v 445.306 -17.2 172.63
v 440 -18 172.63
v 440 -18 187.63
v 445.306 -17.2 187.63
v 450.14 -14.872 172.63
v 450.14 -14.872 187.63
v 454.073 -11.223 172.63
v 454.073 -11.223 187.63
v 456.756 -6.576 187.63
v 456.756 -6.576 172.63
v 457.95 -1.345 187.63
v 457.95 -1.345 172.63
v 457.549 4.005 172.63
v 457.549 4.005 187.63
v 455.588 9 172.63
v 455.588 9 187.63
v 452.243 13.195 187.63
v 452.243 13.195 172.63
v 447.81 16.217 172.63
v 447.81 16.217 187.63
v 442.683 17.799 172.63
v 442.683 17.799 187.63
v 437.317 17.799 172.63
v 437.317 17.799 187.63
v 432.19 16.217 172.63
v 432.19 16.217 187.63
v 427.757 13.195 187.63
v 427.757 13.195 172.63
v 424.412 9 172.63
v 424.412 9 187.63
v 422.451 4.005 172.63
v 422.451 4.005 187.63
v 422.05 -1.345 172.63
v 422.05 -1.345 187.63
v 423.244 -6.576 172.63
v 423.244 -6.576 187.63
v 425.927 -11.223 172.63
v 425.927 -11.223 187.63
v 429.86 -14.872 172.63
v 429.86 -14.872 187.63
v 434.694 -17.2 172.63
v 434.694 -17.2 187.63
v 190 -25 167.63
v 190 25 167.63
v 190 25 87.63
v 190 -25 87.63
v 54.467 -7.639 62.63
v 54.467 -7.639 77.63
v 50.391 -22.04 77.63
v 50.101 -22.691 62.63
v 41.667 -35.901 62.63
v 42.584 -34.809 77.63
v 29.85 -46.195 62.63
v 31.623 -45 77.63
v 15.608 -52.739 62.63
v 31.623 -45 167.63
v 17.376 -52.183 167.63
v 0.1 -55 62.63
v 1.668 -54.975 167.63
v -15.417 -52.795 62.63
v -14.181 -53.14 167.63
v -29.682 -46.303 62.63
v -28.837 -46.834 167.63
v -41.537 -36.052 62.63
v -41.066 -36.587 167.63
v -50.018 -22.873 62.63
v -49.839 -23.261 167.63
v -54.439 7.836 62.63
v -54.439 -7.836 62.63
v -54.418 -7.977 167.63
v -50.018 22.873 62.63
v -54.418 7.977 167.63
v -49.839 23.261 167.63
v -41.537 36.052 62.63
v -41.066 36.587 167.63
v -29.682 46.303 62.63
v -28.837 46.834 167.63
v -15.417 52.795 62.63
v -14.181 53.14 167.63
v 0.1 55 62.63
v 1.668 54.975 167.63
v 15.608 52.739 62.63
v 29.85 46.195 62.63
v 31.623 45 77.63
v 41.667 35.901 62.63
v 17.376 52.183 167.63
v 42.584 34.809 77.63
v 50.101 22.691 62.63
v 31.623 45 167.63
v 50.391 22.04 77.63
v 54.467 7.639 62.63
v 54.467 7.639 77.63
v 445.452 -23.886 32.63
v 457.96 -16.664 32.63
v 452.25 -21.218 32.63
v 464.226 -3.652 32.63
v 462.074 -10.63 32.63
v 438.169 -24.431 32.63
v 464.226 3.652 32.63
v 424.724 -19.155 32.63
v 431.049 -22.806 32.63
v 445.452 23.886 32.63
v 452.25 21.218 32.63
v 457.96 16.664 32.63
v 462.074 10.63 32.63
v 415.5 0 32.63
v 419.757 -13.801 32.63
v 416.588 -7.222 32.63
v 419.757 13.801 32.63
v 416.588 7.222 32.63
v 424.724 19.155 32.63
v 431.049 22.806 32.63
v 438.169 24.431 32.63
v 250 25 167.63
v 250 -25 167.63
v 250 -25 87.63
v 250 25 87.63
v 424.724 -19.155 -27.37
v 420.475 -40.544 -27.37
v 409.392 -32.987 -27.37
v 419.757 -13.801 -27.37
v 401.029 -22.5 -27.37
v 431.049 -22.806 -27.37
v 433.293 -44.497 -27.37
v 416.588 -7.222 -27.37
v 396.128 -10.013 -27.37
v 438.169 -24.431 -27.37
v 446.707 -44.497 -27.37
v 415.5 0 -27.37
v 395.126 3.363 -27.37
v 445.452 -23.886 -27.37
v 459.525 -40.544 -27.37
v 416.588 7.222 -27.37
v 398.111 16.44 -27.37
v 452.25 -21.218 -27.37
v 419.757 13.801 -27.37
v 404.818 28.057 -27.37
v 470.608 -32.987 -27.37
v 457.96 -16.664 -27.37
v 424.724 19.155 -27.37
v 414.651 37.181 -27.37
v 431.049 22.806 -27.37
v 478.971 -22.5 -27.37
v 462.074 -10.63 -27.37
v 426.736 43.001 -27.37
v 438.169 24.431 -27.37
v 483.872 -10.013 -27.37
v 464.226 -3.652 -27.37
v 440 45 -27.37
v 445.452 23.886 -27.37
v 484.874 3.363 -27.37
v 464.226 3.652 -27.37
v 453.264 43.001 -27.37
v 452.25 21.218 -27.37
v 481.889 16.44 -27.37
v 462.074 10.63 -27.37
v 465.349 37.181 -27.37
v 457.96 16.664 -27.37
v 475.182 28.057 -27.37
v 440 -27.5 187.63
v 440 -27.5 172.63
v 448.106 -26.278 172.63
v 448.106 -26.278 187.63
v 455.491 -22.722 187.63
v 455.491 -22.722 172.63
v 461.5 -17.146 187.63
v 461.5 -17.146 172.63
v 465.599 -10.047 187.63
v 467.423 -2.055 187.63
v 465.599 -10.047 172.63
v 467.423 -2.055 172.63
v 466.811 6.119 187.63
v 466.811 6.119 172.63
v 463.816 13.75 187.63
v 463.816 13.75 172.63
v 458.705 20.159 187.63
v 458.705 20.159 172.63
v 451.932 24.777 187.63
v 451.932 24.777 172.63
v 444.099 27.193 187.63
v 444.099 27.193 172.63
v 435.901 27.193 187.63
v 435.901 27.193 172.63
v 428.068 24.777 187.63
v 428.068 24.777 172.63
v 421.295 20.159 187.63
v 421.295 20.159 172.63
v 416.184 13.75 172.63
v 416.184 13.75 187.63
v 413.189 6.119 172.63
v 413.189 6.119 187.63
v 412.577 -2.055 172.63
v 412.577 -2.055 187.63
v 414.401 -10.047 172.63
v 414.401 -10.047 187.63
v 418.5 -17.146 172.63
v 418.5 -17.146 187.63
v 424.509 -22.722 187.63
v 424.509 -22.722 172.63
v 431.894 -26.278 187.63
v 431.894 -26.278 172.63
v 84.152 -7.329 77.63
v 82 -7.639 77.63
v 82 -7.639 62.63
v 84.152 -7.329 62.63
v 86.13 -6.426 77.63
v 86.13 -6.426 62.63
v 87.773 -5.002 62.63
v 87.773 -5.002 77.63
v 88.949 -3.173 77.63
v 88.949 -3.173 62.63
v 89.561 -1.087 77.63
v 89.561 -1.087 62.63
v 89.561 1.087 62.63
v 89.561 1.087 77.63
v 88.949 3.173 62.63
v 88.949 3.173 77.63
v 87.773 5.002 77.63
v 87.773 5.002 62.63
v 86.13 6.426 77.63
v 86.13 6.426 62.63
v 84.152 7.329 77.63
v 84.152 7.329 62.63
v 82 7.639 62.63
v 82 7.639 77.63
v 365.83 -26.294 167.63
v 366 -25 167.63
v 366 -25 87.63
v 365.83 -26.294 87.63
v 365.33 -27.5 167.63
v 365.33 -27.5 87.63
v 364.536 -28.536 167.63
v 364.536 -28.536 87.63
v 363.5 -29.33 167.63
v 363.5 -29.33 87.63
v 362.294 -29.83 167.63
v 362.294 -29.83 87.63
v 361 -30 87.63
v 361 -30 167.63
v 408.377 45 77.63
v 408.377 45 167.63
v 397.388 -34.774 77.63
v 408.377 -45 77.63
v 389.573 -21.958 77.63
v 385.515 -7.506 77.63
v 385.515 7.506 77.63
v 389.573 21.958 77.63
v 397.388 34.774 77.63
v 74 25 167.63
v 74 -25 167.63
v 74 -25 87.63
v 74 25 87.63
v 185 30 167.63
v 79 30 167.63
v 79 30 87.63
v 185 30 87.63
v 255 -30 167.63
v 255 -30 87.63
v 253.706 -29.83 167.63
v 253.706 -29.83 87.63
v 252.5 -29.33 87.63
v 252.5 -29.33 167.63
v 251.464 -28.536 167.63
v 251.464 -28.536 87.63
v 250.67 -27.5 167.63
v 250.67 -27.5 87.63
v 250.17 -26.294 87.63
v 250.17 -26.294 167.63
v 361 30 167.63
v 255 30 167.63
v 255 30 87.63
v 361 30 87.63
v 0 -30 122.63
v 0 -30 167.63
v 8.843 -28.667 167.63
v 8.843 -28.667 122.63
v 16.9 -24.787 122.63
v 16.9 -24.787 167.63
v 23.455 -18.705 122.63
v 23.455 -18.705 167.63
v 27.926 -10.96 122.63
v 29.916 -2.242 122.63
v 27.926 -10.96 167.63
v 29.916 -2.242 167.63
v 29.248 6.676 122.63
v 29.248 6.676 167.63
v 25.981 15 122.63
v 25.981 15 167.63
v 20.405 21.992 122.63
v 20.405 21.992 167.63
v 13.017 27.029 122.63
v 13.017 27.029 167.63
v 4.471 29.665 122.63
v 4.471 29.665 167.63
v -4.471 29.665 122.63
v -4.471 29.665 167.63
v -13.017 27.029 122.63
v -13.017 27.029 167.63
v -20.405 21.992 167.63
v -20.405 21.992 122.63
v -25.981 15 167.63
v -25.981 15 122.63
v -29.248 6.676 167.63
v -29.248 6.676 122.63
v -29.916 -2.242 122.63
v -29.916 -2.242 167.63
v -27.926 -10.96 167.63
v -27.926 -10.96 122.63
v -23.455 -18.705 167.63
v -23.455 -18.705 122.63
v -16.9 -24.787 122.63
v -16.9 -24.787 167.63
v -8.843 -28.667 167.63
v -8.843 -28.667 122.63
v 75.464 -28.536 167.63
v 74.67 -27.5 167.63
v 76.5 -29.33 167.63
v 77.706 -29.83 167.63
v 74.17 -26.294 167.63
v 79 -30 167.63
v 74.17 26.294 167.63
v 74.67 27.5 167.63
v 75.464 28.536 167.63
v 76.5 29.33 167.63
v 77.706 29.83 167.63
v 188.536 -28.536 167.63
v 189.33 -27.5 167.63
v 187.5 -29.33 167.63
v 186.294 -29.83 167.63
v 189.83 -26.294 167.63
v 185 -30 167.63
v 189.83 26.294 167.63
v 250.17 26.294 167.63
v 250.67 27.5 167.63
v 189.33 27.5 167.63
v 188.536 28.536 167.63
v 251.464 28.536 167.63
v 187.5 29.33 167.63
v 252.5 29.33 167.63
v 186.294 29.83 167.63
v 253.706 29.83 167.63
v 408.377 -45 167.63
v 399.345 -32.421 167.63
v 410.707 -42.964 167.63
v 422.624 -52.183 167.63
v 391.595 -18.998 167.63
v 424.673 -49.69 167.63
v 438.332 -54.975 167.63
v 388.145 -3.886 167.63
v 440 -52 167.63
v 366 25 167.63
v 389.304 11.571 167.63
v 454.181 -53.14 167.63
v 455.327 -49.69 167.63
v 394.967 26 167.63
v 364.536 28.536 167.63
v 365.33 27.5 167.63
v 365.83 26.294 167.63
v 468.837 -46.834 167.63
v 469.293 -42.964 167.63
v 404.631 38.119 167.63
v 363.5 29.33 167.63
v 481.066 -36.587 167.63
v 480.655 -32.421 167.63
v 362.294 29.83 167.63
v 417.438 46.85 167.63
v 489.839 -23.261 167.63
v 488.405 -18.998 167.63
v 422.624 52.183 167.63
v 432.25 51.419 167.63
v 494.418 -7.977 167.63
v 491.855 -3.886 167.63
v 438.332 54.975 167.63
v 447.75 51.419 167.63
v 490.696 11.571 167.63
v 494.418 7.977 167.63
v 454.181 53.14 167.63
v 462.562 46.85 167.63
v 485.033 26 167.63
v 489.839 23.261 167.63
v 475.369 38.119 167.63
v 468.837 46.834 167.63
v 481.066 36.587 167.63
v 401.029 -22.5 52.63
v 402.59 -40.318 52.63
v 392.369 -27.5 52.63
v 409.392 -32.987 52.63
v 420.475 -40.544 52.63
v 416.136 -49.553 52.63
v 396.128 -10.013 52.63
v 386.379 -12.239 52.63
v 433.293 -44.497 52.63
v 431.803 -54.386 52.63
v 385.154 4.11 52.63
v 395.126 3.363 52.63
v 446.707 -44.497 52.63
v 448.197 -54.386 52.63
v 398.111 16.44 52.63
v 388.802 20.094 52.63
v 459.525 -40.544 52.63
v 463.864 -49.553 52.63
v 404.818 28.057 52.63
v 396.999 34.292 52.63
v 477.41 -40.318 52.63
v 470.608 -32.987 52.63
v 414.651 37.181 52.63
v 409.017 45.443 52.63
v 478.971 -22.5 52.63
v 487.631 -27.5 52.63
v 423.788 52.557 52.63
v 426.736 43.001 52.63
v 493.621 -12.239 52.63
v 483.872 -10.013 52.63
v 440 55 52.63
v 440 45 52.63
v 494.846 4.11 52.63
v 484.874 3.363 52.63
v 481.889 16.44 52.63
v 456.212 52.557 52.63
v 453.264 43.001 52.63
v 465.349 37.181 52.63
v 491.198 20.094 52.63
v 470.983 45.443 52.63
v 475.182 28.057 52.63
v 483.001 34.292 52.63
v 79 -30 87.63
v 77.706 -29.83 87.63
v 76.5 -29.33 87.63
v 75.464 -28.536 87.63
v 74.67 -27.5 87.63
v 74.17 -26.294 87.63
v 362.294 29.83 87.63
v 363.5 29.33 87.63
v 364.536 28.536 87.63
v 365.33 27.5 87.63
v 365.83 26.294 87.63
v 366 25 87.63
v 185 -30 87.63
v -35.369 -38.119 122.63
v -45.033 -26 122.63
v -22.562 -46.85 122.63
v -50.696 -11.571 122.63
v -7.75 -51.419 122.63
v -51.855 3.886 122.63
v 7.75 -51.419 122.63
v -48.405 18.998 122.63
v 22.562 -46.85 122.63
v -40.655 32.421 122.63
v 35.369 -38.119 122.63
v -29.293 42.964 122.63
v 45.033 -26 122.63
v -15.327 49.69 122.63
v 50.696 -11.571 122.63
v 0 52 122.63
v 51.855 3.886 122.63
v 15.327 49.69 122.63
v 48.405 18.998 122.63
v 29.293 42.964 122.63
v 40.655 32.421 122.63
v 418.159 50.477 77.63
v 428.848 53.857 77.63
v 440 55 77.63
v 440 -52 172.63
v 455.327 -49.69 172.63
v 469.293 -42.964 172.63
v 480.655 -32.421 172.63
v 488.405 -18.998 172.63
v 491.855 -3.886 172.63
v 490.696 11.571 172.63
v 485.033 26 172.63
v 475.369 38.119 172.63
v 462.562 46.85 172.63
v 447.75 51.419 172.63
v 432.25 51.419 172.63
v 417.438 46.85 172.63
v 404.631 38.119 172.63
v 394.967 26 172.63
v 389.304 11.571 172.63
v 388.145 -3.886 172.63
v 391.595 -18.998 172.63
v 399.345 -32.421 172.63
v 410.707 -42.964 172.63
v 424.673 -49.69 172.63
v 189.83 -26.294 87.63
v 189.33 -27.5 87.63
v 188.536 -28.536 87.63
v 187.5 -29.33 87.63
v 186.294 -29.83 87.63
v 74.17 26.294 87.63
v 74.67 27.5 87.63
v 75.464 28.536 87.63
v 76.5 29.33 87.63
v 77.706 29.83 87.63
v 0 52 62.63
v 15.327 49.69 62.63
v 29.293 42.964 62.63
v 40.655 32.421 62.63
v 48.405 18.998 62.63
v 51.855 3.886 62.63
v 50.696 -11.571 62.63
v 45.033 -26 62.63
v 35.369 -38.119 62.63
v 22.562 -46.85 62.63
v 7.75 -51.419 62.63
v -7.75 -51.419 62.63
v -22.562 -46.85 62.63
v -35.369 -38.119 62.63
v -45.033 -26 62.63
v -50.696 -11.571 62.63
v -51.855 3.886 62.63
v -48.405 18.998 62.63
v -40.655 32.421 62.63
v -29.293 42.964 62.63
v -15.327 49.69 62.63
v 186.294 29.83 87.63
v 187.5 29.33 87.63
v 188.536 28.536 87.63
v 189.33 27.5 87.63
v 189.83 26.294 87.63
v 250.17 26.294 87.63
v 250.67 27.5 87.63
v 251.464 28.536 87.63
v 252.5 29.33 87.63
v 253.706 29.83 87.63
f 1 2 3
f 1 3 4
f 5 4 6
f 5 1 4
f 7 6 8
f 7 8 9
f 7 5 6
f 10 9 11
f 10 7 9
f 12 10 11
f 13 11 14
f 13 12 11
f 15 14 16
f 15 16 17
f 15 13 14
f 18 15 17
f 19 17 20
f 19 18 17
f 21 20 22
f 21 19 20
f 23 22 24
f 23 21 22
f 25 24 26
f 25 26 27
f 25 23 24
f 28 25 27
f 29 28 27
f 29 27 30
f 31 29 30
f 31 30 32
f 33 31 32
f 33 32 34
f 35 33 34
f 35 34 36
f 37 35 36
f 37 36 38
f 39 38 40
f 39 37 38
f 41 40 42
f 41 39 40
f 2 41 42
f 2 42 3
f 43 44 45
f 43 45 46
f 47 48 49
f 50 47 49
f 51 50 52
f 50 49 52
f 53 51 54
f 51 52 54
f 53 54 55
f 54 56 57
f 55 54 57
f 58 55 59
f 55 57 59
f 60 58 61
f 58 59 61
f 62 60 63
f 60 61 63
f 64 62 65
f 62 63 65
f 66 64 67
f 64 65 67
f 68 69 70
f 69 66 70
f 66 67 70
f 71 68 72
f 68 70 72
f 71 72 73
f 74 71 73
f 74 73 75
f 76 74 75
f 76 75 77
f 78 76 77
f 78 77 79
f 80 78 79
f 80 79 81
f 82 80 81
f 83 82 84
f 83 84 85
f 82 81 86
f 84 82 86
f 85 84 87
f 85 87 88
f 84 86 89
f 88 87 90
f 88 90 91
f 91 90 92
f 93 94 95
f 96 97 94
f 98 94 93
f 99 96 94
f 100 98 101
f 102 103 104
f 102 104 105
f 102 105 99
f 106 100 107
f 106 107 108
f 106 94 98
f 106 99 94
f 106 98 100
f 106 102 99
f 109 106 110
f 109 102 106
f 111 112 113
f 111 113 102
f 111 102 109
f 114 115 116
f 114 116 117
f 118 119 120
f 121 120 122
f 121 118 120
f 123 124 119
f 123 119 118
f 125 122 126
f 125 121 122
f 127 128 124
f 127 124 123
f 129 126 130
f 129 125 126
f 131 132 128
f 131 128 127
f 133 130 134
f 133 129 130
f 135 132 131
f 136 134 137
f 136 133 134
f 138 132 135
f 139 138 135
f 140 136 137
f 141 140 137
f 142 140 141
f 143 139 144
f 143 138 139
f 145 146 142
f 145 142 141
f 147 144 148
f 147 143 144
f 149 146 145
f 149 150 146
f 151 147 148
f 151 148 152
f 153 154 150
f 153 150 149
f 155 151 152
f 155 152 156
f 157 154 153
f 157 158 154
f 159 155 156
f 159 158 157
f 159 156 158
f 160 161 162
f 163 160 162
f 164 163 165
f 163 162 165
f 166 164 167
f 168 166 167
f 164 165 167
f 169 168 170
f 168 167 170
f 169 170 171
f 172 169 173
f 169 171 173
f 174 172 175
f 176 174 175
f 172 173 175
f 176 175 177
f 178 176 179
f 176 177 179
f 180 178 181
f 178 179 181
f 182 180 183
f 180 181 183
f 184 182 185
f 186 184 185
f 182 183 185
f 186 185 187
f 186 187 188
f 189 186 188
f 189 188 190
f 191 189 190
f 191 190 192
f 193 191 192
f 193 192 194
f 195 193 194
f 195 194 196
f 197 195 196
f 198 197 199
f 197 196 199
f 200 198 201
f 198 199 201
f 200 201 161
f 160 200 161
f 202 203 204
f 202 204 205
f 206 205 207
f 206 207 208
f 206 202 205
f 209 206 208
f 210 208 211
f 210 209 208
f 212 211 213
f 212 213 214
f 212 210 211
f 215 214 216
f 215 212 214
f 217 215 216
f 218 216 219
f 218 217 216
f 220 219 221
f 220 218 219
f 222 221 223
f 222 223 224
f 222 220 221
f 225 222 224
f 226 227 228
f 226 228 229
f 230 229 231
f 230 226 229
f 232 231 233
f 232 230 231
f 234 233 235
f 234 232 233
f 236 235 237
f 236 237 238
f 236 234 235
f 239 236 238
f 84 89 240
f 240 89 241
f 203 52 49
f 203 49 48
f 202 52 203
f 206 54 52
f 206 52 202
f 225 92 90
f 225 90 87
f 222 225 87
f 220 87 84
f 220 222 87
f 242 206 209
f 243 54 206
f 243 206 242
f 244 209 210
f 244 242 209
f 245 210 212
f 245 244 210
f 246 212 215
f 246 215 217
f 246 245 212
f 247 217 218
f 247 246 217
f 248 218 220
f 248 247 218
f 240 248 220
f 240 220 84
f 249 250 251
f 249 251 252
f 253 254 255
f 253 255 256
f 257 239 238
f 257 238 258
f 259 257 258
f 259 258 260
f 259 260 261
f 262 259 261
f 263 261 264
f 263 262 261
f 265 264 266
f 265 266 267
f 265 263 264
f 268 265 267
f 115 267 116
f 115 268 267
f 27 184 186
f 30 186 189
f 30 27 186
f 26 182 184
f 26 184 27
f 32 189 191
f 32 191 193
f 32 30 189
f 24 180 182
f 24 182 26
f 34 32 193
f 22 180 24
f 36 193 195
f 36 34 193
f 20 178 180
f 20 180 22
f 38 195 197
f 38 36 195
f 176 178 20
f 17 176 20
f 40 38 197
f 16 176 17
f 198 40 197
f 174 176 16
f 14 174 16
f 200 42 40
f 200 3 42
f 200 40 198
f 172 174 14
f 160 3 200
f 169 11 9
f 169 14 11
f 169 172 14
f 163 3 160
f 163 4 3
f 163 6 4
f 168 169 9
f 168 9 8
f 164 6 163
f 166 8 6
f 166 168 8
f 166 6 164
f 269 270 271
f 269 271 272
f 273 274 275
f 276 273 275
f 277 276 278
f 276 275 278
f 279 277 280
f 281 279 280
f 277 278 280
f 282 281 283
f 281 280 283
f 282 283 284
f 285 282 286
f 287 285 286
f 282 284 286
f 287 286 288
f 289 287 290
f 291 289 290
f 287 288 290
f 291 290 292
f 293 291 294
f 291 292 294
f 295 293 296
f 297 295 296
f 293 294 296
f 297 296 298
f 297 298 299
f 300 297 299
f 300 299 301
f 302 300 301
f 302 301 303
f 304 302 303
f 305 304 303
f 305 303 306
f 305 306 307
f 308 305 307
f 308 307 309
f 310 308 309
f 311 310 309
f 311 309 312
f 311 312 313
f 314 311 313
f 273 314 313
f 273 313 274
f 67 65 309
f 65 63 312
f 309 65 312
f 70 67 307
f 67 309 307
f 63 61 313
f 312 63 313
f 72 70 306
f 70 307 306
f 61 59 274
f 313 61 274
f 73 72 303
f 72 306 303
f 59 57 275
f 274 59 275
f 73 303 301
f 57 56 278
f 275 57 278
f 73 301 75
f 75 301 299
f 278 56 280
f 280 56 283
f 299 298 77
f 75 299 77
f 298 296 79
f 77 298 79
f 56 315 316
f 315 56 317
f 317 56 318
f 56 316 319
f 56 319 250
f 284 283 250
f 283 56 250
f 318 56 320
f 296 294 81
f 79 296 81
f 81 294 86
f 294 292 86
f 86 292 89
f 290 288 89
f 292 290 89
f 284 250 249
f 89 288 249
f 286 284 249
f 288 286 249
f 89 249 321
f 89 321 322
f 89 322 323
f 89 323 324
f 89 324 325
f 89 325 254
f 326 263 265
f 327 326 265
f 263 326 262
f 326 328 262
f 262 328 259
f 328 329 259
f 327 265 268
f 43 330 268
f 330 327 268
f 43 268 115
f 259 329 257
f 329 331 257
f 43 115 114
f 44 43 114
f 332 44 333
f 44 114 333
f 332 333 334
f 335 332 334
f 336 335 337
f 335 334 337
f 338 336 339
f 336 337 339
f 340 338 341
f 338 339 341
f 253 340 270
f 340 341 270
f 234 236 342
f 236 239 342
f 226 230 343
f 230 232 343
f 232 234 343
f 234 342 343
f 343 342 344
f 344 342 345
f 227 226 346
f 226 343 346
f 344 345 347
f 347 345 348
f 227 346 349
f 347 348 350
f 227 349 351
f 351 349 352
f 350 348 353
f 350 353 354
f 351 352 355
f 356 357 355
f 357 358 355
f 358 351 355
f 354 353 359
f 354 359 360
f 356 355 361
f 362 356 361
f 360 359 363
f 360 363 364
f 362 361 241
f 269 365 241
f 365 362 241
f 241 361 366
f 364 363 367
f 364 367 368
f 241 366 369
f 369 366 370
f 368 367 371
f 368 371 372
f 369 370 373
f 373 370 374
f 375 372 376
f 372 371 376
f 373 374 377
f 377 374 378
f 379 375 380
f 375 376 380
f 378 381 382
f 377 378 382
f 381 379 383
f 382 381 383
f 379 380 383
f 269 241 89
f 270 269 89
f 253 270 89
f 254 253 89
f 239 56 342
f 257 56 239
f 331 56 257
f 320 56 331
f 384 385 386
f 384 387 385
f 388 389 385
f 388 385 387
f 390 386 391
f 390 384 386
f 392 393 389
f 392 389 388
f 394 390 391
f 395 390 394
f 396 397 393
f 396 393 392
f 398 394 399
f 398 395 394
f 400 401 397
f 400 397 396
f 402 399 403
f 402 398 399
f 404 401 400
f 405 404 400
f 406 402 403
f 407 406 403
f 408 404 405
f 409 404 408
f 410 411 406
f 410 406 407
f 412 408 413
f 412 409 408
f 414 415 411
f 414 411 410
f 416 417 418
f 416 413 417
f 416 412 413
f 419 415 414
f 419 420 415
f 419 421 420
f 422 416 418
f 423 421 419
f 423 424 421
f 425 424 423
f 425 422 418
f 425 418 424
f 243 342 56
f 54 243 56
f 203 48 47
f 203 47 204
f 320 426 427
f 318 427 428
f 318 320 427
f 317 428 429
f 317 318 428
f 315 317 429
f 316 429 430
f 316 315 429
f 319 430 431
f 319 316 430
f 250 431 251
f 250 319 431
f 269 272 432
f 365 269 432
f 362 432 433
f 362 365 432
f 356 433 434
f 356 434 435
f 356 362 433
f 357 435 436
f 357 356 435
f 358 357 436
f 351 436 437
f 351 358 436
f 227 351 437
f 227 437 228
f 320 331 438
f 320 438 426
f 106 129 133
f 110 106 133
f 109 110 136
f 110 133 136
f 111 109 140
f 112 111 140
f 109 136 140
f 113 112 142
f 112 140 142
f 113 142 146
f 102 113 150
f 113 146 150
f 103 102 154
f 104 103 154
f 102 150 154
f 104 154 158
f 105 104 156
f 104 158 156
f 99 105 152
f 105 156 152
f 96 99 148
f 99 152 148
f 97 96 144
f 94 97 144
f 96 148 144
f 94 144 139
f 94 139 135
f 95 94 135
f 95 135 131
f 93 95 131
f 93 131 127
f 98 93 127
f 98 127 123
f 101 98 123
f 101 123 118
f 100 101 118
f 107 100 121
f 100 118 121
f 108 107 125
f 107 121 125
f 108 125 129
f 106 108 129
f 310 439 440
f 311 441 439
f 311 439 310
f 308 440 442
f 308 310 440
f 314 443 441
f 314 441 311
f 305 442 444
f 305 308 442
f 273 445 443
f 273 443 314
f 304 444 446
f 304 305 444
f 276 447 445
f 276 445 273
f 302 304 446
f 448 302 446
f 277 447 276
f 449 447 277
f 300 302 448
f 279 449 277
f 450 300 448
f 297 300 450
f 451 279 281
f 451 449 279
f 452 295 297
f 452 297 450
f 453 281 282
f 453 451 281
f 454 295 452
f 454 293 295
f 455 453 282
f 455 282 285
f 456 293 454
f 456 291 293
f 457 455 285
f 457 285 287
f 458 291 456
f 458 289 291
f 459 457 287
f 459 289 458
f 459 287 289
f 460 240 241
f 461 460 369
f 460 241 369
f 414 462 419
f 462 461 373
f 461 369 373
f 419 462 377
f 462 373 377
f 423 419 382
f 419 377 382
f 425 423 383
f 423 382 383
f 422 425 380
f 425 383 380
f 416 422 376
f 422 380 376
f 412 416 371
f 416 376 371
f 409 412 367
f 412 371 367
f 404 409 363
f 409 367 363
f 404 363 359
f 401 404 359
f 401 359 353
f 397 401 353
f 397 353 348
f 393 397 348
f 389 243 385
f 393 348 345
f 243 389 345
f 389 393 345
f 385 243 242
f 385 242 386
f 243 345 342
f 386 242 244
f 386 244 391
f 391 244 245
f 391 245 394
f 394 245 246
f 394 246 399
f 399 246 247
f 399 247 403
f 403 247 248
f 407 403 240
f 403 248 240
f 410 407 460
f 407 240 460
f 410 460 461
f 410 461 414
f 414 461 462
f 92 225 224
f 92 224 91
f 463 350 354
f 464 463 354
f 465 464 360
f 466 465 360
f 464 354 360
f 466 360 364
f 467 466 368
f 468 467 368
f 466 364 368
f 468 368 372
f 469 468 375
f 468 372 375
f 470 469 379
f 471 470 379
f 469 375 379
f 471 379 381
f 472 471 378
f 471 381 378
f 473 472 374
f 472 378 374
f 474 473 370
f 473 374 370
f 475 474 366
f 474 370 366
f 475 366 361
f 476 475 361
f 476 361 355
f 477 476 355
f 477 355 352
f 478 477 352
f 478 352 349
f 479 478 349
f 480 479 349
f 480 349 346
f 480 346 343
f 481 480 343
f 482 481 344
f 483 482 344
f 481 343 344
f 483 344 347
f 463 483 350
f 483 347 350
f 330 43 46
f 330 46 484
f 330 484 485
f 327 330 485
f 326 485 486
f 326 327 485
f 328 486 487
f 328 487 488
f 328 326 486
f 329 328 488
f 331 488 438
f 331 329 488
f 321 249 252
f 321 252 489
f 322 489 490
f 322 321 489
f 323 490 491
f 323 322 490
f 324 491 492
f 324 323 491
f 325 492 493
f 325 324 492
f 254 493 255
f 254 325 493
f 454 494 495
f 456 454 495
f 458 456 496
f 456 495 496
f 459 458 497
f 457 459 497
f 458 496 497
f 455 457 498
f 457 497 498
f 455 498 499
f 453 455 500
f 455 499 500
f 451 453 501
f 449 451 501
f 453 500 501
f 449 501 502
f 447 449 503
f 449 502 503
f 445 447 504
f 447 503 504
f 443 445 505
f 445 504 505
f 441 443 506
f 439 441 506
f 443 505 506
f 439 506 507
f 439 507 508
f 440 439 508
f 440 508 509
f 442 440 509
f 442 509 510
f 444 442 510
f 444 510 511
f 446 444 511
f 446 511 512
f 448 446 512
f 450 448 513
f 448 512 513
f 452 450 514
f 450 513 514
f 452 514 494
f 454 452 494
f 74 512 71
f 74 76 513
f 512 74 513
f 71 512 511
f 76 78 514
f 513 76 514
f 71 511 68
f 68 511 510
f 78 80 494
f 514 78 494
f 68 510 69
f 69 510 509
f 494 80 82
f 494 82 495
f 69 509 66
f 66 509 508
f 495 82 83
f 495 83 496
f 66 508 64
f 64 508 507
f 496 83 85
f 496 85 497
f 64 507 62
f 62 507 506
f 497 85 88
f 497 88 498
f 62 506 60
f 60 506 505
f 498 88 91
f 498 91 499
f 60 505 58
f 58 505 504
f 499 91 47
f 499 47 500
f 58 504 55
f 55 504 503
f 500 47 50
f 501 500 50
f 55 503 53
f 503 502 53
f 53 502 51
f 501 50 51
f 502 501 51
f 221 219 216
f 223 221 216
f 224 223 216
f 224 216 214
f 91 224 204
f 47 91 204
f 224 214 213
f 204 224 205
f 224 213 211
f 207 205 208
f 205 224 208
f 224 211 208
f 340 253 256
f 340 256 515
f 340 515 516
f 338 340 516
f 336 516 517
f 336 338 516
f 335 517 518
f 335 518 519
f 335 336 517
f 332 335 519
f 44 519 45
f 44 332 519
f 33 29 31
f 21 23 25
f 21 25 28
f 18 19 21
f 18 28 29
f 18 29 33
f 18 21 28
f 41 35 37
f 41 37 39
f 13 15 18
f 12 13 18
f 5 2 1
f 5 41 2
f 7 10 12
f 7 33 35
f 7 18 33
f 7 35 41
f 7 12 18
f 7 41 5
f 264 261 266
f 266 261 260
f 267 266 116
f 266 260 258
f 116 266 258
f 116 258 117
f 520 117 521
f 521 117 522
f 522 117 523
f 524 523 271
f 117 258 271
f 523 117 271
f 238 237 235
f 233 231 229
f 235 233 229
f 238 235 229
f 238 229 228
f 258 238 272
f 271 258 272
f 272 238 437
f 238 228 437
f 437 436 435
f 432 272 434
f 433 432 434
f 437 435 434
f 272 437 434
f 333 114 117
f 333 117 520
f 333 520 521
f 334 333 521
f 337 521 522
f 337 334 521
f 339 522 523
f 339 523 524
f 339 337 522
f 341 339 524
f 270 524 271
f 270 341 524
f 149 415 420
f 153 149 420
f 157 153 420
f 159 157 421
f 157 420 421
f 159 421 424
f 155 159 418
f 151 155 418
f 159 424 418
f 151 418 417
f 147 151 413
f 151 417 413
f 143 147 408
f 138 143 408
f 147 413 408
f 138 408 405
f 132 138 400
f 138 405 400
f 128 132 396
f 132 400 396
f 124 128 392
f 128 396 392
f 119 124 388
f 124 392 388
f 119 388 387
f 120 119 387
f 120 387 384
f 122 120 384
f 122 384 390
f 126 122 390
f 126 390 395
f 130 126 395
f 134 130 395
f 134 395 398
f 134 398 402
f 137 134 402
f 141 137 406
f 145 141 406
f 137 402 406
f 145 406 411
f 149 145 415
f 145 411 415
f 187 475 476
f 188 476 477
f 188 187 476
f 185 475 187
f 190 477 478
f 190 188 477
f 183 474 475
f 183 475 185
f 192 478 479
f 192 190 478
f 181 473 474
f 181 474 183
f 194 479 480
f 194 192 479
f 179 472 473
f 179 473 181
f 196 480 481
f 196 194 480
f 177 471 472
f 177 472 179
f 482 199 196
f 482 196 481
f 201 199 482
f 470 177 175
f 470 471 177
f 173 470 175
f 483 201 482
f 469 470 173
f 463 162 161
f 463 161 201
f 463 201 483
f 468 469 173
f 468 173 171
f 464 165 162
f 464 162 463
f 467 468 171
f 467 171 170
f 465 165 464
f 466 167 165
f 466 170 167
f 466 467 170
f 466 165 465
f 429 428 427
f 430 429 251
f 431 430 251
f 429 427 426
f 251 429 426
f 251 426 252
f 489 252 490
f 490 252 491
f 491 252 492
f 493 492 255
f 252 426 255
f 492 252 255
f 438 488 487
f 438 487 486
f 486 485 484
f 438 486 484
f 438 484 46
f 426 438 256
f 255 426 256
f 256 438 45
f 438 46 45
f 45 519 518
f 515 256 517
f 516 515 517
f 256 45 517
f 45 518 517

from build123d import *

# Parameters (mm, degrees)
BOSS_EXTRUDE5_DEPTH   = 90
SKETCH11_3_R          = 55
BOSS_EXTRUDE6_DEPTH   = 115
SKETCH11_4_R          = 55
BOSS_EXTRUDE7_DEPTH   = 105
BOSS_EXTRUDE8_DEPTH   = 15
SKETCH17_R            = 45
BOSS_EXTRUDE9_DEPTH   = 80
SKETCH18_R            = 52
BOSS_EXTRUDE10_DEPTH  = 5
SKETCH19_R            = 27.5
SKETCH19_R_2          = 18
BOSS_EXTRUDE12_DEPTH  = 15
BODY_MOVE_COPY2_ANGLE = 180
SKETCH28_R            = 52
CUT_EXTRUDE2_DEPTH    = 60
CUT_EXTRUDE3_DEPTH    = 80
SKETCH31_R            = 30
CUT_EXTRUDE6_DEPTH    = 196
BODY_MOVE_COPY3_ANGLE = 180
BODY_MOVE_COPY4_ANGLE = 90
BODY_MOVE_COPY6_ANGLE = 180
BODY_MOVE_COPY8_ANGLE = 90
BODY_MOVE_COPY9_ANGLE = 90
SKETCH36_R            = 24.5
CUT_EXTRUDE7_DEPTH    = 60


with BuildPart() as part:
    # Sketch11 → Boss-Extrude5 (new body)
    with BuildSketch(Plane.XY):
        with BuildLine():
            Line((-45, 408.377223398), (-45, 31.622776602))
            ThreePointArc((-45, 31.622776602), (0, -55), (45, 31.622776602))
            Line((45, 31.622776602), (45, 408.377223398))
            ThreePointArc((45, 408.377223398), (0, 495), (-45, 408.377223398))
        make_face()
    extrude(amount=BOSS_EXTRUDE5_DEPTH)

    # Sketch11<3> → Boss-Extrude6 (add)
    with BuildSketch(Plane.XY):
        with Locations((0, 440)):
            Circle(SKETCH11_3_R)
    extrude(amount=BOSS_EXTRUDE6_DEPTH)

    # Sketch11<4> → Boss-Extrude7 (add)
    with BuildSketch(Plane.XY):
        Circle(SKETCH11_4_R)
    extrude(amount=BOSS_EXTRUDE7_DEPTH)

    # Sketch13 → Boss-Extrude8 (add)
    with BuildSketch(Plane.XY.offset(90)):
        with BuildLine():
            Line((7.638888889, 82), (7.638888889, 54.46693838))
            Line((7.638888889, 54.46693838), (-7.638888889, 54.46693838))
            Line((-7.638888889, 54.46693838), (-7.638888889, 82))
            ThreePointArc((-7.638888889, 82), (0, 89.638888889), (7.638888889, 82))
        make_face()
    extrude(amount=BOSS_EXTRUDE8_DEPTH)

    # Sketch17 → Boss-Extrude9 (add)
    with BuildSketch(Plane.XY.offset(115)):
        with Locations((0, 440)):
            Circle(SKETCH17_R)
    extrude(amount=BOSS_EXTRUDE9_DEPTH)

    # Sketch18 → Boss-Extrude10 (add)
    with BuildSketch(Plane(origin=(0, 0, 0), x_dir=(-1, 0, 0), z_dir=(0, 0, -1))):
        with Locations((0, 440)):
            Circle(SKETCH18_R)
    extrude(amount=BOSS_EXTRUDE10_DEPTH)

    # Sketch19 → Boss-Extrude12 (add)
    with BuildSketch(Plane(origin=(0, 0, -5), x_dir=(-1, 0, 0), z_dir=(0, 0, -1))):
        with Locations((0, 440)):
            Circle(SKETCH19_R)
        with Locations((0, 440)):
            Circle(SKETCH19_R_2, mode=Mode.SUBTRACT)
    extrude(amount=BOSS_EXTRUDE12_DEPTH)


with BuildPart() as part_1:
    # Body-Move/Copy2: moved
    add(part.part.rotate(Axis((0, 0, 0), (0, 1, 0)), BODY_MOVE_COPY2_ANGLE))

    # Sketch28 → Cut-Extrude2 (cut)
    with BuildSketch(Plane(origin=(0, 0, -105), x_dir=(-1, 0, 0), z_dir=(0, 0, -1))):
        Circle(SKETCH28_R)
    extrude(amount=-CUT_EXTRUDE2_DEPTH, mode=Mode.SUBTRACT)

    # Sketch29 → Cut-Extrude3 (cut)
    with BuildSketch(Plane.XY):
        with BuildLine():
            ThreePointArc((-30, 361), (-28.535533906, 364.535533906), (-25, 366))
            Line((-25, 366), (25, 366))
            ThreePointArc((25, 366), (28.535533906, 364.535533906), (30, 361))
            Line((30, 361), (30, 255))
            ThreePointArc((30, 255), (28.535533906, 251.464466094), (25, 250))
            Line((25, 250), (-25, 250))
            ThreePointArc((-25, 250), (-28.535533906, 251.464466094), (-30, 255))
            Line((-30, 255), (-30, 361))
        make_face()
        with BuildLine():
            ThreePointArc((-30, 185), (-28.535533906, 188.535533906), (-25, 190))
            Line((-25, 190), (25, 190))
            ThreePointArc((25, 190), (28.535533906, 188.535533906), (30, 185))
            Line((30, 185), (30, 79))
            ThreePointArc((30, 79), (28.535533906, 75.464466094), (25, 74))
            Line((25, 74), (-25, 74))
            ThreePointArc((-25, 74), (-28.535533906, 75.464466094), (-30, 79))
            Line((-30, 79), (-30, 185))
        make_face()
    extrude(amount=-CUT_EXTRUDE3_DEPTH, mode=Mode.SUBTRACT)

    # Sketch31 → Cut-Extrude6 (cut, through all)
    with BuildSketch(Plane.XY):
        Circle(SKETCH31_R)
    extrude(amount=-CUT_EXTRUDE6_DEPTH, mode=Mode.SUBTRACT)


with BuildPart() as part_2:
    # Body-Move/Copy3: moved
    add(part_1.part.moved(Location((0, 0, 0))).rotate(Axis((0, 0, -87.5), (0, 1, 0)), BODY_MOVE_COPY3_ANGLE))


with BuildPart() as part_3:
    # Body-Move/Copy4: moved
    add(part_2.part.rotate(Axis((0, 225, 0), (0, 0, -1)), BODY_MOVE_COPY4_ANGLE))


with BuildPart() as part_4:
    # Body-Move/Copy6: moved
    add(part_3.part.rotate(Axis((225, 0, -17.5), (0, 1, 0)), BODY_MOVE_COPY6_ANGLE))


with BuildPart() as part_5:
    # Body-Move/Copy7: moved
    add(part_4.part.moved(Location((-675, -225, -35))))


with BuildPart() as part_6:
    # Body-Move/Copy8: moved
    add(part_5.part.rotate(Axis((-225, 0, 0), (0, 0, -1)), BODY_MOVE_COPY8_ANGLE))


with BuildPart() as part_7:
    # Body-Move/Copy9: moved
    add(part_6.part.rotate(Axis((-225, 0, 0), (0, 0, -1)), BODY_MOVE_COPY9_ANGLE))


with BuildPart() as part_8:
    # Body-Move/Copy10: moved
    add(part_7.part.moved(Location((450, 1e-09, 0))))


with BuildPart() as part_9:
    # Body-Move/Copy14: moved
    add(part_8.part.moved(Location((0, 0, 62.63))))

    # Sketch36 → Cut-Extrude7 (cut)
    with BuildSketch(Plane(origin=(0, 0, -27.37), x_dir=(-1, 0, 0), z_dir=(0, 0, -1))):
        with Locations((-440, 2e-09)):
            Circle(SKETCH36_R)
    extrude(amount=-CUT_EXTRUDE7_DEPTH, mode=Mode.SUBTRACT)


solid = part_9.part
